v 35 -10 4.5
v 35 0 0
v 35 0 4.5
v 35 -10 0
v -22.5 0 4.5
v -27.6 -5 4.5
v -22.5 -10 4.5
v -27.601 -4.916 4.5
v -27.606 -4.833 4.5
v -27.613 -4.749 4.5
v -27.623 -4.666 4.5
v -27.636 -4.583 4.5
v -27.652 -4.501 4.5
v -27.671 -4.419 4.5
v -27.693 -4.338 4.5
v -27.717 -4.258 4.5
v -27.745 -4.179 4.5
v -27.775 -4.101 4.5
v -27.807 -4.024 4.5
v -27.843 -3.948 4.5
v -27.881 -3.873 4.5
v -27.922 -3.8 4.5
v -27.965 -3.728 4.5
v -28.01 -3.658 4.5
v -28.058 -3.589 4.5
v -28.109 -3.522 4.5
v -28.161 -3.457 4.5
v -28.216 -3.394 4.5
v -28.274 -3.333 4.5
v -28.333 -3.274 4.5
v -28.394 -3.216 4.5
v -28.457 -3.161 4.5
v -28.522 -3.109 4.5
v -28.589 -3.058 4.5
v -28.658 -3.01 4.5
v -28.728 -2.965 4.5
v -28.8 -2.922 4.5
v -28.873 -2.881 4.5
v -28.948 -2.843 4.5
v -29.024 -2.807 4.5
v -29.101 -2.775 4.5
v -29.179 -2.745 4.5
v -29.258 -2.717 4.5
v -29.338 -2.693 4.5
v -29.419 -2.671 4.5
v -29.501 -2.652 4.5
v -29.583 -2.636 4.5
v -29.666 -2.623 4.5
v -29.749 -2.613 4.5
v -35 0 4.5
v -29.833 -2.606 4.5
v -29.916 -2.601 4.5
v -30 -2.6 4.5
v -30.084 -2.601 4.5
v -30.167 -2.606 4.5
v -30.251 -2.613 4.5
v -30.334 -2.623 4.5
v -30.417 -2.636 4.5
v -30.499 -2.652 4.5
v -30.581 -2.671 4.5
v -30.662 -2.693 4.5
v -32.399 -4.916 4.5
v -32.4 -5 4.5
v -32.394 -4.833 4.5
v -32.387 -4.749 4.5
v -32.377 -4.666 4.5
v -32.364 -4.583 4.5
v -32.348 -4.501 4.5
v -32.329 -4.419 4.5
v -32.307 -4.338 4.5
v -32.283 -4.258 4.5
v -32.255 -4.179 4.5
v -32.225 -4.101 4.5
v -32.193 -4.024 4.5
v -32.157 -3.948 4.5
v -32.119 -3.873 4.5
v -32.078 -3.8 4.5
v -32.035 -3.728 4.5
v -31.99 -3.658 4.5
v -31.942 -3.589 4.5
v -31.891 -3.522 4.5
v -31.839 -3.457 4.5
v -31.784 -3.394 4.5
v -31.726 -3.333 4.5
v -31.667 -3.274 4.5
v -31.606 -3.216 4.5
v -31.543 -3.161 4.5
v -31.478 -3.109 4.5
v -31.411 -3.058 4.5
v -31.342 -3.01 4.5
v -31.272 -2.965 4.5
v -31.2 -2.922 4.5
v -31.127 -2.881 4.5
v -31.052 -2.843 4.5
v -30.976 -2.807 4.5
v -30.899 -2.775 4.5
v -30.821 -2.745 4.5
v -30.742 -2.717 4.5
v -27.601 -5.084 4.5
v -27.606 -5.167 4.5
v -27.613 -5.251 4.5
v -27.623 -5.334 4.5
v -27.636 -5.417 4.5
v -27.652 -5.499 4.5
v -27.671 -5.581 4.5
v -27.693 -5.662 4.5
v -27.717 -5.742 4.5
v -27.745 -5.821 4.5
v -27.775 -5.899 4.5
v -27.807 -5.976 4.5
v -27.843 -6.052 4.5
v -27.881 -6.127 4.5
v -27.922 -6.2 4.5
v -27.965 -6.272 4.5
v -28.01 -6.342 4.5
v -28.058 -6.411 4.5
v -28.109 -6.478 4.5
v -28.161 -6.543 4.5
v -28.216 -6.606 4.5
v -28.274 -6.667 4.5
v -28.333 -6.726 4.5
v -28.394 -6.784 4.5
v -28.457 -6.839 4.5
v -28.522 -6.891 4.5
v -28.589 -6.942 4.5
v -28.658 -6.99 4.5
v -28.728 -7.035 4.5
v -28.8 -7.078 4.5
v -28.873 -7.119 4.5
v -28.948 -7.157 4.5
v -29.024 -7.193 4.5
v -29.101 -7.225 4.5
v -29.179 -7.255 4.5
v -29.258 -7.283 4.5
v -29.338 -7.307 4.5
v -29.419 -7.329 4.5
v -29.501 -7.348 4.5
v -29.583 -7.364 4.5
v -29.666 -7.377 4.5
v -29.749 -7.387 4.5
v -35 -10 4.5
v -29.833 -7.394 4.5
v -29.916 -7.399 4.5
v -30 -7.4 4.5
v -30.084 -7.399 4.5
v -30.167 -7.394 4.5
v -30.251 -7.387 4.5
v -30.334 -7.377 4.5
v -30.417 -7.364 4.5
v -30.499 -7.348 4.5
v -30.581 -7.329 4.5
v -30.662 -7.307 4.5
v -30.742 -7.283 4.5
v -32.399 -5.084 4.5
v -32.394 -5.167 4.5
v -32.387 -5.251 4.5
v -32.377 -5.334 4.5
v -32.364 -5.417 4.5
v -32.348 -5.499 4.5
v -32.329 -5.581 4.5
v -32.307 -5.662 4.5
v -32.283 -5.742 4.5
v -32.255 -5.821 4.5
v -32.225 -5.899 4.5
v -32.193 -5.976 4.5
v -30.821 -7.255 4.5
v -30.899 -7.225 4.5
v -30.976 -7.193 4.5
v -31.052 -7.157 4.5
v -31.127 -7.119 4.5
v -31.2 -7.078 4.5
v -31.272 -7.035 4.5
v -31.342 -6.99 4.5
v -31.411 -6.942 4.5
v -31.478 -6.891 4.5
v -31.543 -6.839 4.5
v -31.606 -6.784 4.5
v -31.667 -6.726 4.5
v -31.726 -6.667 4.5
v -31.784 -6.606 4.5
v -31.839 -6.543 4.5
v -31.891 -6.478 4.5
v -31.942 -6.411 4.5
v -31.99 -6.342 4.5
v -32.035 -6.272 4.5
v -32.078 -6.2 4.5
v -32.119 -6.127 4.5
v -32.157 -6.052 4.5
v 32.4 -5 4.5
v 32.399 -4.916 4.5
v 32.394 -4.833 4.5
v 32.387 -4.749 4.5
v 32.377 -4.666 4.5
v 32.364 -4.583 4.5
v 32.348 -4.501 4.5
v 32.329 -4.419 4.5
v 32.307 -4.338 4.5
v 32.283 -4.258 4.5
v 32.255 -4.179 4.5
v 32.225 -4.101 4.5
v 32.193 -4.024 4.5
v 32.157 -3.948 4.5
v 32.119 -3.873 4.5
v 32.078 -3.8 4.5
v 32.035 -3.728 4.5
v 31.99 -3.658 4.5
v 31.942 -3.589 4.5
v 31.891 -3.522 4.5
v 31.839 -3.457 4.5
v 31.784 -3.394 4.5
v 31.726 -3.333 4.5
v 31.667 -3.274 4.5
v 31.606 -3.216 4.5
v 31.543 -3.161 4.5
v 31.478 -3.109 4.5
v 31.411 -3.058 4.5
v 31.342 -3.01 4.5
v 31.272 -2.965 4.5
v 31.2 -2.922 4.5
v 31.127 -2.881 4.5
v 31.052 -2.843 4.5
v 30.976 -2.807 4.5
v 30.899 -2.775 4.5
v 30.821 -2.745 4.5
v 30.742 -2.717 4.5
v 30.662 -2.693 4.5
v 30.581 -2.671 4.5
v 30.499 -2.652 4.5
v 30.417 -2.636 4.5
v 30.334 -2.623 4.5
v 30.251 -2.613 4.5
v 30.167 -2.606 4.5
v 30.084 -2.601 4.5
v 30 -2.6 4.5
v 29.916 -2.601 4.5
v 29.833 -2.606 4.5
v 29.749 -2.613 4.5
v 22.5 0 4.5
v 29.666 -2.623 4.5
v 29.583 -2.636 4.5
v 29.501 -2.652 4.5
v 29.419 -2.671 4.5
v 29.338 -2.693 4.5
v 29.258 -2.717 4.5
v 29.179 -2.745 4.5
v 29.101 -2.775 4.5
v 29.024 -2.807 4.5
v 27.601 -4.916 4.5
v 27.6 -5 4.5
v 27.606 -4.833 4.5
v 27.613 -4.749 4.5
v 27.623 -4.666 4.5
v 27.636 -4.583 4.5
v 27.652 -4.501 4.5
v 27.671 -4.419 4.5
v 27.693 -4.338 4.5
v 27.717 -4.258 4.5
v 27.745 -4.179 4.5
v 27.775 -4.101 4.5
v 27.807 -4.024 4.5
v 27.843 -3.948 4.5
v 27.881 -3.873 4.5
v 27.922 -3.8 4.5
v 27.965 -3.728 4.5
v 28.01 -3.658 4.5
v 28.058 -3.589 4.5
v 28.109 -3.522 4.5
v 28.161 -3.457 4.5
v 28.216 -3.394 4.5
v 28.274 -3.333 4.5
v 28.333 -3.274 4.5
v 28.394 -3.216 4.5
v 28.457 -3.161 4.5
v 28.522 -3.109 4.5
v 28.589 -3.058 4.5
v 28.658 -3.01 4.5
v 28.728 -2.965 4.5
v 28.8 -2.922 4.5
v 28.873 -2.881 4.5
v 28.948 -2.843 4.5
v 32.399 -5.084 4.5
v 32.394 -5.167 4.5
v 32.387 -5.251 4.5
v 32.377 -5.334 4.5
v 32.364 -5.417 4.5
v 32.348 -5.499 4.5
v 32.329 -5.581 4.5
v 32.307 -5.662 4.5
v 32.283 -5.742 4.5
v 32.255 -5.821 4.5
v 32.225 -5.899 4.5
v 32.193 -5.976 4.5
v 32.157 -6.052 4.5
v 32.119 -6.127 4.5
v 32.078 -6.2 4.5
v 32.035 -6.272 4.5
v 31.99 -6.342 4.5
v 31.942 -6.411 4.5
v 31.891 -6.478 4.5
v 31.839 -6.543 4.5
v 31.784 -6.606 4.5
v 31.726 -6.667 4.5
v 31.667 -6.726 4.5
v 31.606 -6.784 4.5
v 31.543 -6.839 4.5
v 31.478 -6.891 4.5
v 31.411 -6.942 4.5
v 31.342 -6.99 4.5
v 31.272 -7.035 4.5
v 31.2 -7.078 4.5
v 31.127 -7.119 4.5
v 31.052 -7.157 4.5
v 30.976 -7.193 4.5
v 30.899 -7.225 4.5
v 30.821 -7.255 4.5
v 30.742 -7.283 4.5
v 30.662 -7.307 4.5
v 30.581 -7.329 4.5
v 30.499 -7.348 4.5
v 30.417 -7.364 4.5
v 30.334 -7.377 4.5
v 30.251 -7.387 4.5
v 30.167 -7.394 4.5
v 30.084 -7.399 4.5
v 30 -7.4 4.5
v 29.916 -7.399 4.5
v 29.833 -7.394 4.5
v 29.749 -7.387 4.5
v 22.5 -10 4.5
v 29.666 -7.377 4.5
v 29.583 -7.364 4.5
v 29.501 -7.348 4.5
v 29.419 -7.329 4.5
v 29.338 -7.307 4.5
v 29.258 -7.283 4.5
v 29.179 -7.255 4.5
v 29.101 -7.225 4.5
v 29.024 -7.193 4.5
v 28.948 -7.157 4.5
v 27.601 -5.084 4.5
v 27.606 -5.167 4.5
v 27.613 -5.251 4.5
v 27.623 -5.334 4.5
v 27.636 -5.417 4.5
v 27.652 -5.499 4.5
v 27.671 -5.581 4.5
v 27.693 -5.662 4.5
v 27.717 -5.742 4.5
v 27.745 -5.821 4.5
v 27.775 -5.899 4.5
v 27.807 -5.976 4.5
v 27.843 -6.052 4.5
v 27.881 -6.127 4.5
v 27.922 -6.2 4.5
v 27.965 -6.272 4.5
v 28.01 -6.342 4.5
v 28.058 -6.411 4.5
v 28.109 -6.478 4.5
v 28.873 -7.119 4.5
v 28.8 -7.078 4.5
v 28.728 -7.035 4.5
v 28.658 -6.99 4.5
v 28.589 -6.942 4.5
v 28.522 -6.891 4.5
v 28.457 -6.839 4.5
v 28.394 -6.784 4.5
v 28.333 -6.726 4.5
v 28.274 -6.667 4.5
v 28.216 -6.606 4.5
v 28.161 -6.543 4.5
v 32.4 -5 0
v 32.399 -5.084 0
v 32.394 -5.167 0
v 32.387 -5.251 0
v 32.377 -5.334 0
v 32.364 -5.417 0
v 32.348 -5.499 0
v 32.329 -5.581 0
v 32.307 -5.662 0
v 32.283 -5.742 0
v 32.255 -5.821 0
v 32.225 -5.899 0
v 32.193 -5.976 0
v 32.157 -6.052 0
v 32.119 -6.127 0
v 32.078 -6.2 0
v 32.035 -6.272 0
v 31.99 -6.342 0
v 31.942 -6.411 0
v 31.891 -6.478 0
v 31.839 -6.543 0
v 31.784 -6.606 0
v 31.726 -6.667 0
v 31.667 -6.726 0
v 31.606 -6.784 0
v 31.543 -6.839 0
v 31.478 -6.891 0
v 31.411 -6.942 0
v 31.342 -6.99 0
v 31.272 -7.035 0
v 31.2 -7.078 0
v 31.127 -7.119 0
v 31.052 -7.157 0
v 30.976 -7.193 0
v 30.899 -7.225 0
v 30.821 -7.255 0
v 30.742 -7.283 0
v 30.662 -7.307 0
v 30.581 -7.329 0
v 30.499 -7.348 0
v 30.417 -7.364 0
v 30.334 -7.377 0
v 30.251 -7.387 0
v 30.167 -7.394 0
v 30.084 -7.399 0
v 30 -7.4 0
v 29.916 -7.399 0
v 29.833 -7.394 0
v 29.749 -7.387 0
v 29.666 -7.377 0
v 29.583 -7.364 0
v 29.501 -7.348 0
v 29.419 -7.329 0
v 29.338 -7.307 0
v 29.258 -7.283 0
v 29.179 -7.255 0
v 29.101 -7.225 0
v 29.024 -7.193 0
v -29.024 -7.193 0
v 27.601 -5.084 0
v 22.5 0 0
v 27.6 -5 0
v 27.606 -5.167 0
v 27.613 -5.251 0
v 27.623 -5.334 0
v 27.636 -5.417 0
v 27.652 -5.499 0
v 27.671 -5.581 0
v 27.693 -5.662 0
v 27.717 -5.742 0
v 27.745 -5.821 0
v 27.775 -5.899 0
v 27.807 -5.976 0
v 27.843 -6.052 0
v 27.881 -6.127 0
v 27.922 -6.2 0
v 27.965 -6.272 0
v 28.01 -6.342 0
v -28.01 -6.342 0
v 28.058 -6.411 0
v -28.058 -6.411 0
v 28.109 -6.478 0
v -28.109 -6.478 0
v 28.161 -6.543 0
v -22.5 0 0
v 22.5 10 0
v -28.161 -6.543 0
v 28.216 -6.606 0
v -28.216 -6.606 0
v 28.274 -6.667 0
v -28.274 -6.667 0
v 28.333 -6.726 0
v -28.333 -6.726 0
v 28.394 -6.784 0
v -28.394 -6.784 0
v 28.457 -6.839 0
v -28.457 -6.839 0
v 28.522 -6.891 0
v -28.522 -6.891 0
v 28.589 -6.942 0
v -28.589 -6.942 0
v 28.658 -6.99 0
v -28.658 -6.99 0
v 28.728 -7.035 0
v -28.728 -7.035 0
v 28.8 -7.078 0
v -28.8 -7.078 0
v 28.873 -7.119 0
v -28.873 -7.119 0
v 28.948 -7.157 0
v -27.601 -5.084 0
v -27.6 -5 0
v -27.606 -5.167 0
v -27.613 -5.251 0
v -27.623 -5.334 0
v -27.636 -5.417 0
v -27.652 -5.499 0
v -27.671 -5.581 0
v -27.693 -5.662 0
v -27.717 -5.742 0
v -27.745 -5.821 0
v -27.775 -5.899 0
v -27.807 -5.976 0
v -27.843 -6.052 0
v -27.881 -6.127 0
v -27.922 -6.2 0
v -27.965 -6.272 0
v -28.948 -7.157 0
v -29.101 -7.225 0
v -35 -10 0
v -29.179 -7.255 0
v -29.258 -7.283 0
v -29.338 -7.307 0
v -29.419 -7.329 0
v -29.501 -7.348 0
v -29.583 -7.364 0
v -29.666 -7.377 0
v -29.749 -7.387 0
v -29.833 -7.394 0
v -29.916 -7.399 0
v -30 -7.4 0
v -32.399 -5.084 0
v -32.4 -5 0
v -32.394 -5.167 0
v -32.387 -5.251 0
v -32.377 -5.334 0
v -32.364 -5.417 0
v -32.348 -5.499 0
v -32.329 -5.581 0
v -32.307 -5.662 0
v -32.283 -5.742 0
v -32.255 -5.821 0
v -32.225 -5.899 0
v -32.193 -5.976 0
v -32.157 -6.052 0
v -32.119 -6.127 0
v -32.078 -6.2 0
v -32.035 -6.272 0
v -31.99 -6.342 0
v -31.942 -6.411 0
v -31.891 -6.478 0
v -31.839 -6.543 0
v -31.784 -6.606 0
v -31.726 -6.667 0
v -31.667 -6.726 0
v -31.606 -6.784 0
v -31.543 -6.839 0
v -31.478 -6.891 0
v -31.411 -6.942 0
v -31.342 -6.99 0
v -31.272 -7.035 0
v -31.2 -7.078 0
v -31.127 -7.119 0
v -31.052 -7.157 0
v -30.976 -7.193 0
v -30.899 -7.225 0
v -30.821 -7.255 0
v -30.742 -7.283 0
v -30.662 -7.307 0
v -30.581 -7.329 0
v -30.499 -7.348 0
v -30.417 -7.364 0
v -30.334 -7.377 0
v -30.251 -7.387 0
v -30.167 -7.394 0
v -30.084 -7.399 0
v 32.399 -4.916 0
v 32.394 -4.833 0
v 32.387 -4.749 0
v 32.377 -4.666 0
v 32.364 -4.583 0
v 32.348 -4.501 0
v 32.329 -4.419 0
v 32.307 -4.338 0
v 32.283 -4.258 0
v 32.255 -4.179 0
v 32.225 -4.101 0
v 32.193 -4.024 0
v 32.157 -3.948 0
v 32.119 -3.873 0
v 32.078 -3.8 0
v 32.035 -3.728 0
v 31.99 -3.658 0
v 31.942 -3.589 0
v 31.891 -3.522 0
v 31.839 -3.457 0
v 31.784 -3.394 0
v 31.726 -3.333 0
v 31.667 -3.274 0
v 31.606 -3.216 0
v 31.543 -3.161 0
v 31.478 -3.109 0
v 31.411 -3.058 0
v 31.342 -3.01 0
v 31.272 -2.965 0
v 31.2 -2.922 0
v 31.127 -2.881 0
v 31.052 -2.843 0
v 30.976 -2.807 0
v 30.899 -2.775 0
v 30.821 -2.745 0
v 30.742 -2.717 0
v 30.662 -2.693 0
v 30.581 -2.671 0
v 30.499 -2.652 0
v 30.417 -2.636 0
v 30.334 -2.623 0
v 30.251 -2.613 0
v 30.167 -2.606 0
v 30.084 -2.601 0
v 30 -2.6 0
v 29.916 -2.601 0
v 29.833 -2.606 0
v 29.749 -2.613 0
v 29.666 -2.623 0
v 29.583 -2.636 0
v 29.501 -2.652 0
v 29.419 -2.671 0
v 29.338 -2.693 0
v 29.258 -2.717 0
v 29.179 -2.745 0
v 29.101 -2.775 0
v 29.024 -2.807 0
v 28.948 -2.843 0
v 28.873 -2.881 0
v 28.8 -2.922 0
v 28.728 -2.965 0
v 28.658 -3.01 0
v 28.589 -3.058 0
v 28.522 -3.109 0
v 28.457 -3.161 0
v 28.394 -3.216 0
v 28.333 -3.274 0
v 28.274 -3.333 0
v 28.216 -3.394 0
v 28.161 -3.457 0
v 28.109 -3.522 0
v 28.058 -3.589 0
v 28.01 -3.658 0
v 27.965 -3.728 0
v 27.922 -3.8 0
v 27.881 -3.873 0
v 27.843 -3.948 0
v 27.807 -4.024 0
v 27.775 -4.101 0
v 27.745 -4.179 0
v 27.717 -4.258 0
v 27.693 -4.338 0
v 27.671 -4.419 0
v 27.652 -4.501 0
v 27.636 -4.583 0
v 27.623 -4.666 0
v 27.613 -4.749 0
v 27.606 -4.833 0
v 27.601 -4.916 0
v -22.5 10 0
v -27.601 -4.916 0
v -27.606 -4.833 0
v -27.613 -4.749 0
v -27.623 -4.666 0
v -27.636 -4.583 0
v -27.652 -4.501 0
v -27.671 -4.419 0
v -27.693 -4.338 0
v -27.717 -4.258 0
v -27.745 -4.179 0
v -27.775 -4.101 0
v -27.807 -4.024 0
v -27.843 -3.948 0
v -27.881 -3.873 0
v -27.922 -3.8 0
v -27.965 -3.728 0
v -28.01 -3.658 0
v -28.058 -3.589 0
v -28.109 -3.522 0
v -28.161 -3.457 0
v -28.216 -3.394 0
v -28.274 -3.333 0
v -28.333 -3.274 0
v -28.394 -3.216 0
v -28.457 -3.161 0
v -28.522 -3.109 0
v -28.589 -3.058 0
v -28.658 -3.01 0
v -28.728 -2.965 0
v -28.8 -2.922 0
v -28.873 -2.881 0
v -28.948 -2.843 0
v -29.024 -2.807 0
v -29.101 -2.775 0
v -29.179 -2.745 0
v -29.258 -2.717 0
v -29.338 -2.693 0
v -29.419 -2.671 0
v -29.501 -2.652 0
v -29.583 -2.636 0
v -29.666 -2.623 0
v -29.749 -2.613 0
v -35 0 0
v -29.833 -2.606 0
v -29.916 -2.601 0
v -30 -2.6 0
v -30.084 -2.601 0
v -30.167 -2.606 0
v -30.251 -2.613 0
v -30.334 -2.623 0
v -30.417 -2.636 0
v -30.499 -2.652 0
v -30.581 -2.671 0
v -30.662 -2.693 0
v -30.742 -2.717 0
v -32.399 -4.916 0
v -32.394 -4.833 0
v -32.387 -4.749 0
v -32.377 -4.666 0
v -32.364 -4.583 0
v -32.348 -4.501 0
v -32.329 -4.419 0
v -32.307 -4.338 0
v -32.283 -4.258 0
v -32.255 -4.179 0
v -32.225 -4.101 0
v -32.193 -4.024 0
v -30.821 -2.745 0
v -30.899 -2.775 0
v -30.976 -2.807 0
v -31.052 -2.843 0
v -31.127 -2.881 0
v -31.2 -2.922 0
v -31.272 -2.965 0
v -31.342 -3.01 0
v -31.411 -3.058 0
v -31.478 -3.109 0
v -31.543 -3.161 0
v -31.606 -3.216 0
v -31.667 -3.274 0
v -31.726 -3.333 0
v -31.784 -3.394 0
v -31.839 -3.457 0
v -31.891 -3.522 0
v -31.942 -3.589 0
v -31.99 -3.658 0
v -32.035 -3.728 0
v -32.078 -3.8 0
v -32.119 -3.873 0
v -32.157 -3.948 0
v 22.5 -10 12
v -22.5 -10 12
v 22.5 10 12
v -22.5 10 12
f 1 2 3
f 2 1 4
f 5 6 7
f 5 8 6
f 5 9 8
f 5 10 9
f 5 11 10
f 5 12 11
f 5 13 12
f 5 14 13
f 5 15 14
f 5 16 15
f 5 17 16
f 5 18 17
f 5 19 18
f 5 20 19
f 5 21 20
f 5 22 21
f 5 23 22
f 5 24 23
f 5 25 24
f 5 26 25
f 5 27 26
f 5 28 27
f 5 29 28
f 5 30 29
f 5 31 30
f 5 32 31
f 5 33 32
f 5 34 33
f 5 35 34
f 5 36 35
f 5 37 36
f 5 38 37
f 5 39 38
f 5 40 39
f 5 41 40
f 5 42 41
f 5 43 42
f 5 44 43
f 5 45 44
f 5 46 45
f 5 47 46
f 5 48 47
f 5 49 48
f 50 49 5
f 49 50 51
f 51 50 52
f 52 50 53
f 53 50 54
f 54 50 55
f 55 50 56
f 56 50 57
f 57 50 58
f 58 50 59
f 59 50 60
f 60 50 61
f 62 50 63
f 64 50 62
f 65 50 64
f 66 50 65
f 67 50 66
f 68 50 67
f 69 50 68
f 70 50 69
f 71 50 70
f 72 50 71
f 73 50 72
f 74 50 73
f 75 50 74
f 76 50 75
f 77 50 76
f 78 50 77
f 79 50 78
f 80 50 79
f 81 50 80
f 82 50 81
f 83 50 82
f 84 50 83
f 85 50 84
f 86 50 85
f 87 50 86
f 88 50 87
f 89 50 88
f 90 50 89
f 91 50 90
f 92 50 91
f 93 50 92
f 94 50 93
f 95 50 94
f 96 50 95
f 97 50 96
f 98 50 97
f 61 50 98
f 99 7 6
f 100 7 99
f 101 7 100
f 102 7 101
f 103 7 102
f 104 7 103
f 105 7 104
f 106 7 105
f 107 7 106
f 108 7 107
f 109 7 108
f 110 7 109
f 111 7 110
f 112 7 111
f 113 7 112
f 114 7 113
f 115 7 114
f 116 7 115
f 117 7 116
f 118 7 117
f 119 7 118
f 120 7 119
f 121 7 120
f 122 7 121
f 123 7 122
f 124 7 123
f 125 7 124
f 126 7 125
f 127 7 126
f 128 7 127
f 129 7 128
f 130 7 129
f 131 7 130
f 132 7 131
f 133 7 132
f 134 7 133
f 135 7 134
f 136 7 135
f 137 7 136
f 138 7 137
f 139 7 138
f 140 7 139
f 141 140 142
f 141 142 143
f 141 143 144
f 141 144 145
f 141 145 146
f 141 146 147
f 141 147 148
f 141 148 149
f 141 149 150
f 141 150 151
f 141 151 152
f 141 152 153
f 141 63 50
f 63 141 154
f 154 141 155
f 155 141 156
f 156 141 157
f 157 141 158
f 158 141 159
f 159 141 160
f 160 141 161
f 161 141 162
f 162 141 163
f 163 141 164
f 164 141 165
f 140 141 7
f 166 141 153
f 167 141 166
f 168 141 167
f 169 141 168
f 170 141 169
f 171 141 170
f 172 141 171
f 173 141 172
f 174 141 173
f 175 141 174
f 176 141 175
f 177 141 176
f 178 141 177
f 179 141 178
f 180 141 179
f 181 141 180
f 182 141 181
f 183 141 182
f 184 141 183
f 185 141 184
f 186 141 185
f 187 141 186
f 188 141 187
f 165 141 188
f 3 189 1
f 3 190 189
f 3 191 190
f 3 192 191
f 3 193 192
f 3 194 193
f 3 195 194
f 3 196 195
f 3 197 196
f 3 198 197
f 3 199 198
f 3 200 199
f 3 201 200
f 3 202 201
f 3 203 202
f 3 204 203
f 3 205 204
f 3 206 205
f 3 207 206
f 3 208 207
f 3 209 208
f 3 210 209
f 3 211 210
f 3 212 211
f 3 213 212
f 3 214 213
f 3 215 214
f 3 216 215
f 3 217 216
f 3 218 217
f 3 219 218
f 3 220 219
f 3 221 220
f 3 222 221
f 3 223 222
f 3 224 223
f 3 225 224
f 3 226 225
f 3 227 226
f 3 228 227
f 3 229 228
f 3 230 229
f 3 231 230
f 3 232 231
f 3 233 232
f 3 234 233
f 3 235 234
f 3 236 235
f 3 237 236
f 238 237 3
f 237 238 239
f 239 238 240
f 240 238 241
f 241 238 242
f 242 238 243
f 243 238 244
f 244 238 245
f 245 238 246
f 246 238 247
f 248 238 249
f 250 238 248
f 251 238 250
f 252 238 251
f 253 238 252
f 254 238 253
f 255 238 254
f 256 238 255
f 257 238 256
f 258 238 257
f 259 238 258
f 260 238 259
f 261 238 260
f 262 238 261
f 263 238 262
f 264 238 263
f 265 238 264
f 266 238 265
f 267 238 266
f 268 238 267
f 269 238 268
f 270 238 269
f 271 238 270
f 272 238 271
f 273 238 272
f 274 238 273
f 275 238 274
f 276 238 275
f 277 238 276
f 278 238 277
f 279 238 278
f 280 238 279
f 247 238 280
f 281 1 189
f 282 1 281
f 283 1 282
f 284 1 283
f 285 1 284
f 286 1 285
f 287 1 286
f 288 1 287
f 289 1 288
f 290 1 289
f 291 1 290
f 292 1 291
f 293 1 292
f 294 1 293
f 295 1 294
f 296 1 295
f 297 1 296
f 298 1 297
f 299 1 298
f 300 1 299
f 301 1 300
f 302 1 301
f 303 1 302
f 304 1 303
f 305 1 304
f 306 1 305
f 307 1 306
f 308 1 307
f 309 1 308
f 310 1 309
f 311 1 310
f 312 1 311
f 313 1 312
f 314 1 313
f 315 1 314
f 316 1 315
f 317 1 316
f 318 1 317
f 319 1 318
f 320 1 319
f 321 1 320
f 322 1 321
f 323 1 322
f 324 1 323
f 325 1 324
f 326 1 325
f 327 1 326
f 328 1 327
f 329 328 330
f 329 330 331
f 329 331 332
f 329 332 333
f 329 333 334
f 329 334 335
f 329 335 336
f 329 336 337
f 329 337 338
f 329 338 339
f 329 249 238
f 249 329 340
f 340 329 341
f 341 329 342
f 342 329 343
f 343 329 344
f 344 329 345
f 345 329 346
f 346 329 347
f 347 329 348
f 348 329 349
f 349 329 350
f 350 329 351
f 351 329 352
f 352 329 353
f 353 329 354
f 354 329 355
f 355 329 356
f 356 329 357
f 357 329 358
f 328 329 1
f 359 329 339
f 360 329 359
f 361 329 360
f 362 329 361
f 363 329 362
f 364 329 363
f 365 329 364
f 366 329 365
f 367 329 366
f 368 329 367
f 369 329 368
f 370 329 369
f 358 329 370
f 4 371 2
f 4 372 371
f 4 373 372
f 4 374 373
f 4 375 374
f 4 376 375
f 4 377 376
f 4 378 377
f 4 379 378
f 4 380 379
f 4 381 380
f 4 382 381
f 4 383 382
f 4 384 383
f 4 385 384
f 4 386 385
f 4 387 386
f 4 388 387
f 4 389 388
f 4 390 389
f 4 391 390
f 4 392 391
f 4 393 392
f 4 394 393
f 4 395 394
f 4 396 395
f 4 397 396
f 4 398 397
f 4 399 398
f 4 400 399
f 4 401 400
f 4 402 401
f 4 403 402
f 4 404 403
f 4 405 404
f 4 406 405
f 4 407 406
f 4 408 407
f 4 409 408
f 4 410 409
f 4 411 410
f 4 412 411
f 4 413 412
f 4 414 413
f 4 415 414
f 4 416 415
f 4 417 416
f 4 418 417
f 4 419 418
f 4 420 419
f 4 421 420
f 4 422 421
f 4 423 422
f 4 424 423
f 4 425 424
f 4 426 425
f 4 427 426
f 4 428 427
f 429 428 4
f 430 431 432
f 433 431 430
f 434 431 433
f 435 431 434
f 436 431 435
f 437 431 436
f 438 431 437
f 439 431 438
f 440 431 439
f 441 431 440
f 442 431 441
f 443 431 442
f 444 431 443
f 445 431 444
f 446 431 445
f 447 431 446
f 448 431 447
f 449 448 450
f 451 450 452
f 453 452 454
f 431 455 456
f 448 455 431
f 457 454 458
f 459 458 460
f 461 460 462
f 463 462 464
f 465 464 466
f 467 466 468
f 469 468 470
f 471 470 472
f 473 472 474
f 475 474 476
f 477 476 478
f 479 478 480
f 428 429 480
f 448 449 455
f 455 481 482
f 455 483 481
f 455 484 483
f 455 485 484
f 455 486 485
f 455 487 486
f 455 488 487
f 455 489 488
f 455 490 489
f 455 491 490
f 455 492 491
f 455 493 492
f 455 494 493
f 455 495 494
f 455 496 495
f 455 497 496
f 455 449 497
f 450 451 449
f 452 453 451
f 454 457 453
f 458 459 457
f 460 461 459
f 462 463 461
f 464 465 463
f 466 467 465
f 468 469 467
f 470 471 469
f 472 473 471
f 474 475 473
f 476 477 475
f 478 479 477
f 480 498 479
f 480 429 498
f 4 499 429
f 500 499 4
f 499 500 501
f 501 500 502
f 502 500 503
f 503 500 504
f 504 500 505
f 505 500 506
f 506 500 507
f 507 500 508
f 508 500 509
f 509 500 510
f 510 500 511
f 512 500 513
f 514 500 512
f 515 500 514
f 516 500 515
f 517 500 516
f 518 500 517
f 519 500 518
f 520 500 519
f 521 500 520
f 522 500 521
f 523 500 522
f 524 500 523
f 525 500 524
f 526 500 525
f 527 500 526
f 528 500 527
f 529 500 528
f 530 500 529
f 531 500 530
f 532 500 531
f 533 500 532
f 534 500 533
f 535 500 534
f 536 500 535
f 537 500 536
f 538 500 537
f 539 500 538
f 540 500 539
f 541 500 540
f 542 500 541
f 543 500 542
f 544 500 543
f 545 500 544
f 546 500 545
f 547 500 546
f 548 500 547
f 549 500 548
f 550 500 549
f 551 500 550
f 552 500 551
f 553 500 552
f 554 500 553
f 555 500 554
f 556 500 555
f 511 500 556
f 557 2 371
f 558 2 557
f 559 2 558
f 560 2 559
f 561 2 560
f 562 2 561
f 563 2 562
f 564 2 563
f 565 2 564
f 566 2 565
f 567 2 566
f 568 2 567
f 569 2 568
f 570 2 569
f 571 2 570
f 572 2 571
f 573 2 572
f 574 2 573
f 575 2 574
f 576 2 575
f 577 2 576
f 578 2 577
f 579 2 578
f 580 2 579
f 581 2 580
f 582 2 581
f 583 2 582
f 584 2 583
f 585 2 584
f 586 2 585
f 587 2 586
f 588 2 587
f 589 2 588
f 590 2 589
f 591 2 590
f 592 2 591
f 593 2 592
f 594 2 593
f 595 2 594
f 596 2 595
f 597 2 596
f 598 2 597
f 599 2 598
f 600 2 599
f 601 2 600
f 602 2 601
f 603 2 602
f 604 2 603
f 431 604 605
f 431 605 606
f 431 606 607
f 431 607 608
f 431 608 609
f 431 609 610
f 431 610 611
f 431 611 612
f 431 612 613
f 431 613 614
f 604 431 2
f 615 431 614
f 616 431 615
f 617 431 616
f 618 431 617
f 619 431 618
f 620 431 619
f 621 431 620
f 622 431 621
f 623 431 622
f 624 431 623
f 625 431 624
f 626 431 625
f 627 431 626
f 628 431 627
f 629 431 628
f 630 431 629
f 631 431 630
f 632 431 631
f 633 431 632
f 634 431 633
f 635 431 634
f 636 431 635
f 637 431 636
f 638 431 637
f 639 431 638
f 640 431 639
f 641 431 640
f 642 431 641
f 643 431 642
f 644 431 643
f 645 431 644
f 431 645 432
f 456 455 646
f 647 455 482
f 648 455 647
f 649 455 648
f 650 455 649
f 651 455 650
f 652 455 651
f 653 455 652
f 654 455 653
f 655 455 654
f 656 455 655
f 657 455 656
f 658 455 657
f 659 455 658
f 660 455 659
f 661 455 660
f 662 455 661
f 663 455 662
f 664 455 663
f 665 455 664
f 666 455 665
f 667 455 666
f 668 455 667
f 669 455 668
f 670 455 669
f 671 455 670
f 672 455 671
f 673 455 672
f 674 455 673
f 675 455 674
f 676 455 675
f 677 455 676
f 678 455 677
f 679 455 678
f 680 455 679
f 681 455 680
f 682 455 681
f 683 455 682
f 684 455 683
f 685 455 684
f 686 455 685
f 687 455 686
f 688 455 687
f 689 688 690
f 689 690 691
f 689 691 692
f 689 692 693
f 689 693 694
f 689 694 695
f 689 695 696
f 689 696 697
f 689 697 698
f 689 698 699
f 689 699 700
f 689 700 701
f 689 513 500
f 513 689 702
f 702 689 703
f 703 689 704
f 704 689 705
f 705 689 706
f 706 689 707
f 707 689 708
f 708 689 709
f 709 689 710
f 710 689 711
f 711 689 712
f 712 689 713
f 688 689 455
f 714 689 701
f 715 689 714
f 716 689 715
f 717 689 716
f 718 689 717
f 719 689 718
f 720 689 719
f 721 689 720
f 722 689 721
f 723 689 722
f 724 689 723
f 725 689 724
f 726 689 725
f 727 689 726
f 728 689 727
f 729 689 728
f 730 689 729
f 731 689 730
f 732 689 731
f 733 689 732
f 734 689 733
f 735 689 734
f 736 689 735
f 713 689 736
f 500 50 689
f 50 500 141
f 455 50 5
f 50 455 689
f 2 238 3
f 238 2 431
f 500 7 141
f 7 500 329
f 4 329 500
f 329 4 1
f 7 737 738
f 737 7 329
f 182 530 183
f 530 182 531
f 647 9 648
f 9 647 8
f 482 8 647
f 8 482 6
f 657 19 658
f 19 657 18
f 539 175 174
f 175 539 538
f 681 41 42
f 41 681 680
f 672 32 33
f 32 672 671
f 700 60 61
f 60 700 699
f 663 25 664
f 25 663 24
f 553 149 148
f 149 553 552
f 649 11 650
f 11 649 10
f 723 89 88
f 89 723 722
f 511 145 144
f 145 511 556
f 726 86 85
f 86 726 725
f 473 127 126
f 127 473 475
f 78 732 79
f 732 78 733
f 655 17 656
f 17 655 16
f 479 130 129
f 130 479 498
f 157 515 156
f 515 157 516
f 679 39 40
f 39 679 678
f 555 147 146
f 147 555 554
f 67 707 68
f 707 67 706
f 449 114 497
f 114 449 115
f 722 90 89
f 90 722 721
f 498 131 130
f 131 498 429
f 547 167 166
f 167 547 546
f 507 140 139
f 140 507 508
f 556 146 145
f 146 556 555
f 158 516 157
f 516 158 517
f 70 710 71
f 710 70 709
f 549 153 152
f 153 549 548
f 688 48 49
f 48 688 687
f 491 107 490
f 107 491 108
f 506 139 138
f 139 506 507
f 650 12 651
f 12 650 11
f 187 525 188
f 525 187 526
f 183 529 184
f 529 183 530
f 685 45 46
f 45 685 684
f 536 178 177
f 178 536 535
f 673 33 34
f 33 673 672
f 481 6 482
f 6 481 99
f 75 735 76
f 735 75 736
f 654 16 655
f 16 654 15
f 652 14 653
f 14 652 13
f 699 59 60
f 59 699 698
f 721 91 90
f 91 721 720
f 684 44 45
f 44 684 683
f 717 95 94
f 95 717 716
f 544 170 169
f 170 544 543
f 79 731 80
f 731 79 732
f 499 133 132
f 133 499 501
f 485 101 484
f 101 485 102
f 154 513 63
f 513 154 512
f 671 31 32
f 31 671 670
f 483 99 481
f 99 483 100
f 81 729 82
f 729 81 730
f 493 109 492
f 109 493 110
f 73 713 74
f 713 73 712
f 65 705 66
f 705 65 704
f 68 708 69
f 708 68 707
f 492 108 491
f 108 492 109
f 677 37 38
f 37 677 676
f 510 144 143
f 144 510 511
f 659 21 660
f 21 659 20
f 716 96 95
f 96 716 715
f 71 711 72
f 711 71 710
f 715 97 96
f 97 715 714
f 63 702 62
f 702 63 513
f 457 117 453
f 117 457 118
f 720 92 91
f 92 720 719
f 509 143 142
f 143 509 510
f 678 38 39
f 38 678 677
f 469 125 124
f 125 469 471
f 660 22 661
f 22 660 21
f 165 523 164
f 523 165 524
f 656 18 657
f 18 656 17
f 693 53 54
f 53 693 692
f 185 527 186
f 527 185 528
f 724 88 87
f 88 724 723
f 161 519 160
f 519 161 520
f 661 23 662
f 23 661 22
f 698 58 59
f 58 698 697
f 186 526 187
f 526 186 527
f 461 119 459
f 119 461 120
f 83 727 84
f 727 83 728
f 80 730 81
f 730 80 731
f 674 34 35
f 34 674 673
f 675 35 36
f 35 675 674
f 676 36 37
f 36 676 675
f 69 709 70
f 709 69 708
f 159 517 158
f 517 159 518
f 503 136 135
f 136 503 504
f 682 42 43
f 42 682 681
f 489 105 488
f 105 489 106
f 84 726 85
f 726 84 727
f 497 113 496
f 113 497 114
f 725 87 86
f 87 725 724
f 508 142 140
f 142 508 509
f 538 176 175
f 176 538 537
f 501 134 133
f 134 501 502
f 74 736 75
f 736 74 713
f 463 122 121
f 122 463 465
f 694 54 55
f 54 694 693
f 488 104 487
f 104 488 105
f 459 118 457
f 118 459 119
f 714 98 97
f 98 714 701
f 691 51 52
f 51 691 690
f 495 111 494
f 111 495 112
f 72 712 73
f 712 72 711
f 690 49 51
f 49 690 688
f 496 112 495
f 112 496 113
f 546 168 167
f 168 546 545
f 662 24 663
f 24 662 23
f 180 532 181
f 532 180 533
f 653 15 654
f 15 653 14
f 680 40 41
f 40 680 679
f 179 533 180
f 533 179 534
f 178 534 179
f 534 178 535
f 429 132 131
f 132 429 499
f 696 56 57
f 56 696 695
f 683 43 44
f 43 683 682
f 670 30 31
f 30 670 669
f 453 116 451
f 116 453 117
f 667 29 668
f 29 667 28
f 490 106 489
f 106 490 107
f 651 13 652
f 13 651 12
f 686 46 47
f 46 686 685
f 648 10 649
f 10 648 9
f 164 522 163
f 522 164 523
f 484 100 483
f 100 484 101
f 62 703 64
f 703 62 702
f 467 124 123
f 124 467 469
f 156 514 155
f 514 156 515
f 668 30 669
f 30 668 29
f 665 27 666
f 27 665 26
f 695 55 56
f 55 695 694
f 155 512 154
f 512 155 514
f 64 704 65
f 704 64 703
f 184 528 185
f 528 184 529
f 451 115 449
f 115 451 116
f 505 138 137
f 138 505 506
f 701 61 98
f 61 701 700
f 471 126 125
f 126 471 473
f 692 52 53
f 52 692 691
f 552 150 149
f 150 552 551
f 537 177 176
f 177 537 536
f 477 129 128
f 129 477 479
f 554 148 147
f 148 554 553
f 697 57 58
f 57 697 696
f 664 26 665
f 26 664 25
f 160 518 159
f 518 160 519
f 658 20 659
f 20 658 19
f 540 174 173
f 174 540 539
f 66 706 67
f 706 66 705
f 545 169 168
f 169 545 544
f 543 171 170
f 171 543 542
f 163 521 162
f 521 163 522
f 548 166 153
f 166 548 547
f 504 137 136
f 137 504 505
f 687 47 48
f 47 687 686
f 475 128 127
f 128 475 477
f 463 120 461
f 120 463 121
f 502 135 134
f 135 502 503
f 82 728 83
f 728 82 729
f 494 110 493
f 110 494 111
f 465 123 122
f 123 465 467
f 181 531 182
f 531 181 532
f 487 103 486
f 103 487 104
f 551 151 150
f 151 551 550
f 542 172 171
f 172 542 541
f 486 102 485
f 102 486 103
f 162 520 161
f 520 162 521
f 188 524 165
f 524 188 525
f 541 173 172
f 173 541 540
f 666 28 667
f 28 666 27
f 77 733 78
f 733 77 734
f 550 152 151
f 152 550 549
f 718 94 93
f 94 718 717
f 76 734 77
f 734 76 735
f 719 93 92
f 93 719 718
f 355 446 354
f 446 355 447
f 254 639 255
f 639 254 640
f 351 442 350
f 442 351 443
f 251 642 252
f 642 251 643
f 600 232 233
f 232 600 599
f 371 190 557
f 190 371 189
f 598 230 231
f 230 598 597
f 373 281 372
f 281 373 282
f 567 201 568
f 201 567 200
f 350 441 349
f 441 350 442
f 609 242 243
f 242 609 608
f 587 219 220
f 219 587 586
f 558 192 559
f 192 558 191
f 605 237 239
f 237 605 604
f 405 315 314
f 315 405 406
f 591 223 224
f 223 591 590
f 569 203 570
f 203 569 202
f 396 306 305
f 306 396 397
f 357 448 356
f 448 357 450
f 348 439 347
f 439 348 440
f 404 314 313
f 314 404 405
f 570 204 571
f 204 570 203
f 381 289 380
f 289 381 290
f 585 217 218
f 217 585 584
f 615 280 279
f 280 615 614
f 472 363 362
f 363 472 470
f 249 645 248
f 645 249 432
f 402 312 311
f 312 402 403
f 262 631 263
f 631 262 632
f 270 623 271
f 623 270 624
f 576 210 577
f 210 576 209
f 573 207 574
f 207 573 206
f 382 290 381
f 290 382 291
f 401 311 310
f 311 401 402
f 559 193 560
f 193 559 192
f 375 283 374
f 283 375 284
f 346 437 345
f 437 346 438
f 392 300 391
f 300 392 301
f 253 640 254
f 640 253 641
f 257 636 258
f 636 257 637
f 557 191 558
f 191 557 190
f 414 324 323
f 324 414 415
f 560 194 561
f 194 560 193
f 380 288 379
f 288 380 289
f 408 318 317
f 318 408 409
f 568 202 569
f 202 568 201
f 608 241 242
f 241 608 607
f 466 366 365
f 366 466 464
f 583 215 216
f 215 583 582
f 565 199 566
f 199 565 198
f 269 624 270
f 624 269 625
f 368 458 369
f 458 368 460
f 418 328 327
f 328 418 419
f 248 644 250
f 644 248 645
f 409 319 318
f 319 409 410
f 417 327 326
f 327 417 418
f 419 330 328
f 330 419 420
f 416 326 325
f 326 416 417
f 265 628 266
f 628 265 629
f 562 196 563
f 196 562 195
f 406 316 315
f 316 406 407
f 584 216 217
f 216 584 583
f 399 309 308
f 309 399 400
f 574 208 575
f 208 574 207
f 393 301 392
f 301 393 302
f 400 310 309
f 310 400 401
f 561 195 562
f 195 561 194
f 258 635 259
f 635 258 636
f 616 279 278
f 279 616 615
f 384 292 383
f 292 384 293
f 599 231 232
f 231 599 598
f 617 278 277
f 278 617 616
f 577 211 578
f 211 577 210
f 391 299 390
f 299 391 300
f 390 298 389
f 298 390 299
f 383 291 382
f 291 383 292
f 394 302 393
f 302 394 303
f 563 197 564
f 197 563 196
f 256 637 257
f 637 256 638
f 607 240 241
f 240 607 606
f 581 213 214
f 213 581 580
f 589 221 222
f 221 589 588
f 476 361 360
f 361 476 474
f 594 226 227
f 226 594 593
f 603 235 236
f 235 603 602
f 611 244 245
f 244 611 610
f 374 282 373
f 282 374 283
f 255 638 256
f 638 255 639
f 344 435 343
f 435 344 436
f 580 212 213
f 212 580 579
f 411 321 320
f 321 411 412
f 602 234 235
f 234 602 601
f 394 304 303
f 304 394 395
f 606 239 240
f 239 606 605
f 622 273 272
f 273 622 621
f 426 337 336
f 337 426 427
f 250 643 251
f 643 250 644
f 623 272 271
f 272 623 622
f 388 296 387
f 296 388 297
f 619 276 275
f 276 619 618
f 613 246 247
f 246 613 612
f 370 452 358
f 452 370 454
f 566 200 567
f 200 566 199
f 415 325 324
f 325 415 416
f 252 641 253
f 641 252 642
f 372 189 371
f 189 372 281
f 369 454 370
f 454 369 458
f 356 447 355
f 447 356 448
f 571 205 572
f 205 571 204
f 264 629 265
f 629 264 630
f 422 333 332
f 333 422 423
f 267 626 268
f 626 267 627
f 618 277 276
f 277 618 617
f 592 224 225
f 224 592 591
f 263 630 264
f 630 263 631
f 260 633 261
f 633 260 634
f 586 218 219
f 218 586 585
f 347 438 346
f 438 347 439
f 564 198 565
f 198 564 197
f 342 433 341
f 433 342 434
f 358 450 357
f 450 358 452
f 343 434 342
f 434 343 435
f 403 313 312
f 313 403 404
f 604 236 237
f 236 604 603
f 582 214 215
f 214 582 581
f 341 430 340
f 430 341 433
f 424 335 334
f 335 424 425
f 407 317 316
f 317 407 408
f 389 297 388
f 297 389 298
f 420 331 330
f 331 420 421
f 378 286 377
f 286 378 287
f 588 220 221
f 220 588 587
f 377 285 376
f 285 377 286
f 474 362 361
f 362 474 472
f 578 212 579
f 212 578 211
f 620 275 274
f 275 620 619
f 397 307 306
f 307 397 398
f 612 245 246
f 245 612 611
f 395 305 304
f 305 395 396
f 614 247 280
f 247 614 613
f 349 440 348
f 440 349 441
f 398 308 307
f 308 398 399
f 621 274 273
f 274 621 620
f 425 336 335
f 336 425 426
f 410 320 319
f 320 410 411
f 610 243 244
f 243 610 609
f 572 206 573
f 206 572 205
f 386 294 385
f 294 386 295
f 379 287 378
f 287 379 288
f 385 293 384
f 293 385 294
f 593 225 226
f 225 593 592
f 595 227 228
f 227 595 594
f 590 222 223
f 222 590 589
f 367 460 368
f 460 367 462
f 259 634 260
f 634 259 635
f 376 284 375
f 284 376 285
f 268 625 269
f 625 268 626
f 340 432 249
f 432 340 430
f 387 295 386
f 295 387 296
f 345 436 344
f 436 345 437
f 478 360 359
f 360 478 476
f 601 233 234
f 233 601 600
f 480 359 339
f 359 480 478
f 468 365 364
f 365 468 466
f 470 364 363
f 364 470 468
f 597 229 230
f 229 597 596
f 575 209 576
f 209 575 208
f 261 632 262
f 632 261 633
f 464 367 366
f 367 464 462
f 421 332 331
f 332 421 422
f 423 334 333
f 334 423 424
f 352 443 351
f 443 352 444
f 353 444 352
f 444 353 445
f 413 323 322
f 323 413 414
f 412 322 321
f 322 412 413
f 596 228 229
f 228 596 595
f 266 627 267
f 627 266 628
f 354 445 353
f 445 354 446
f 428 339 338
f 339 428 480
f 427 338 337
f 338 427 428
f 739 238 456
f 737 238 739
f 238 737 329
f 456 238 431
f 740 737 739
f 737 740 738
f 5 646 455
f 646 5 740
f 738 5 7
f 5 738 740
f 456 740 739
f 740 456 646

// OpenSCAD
$fn=180;
//intended to support extruder motor mounted on top of plate
module plate_spacer() {
    difference() {
        translate([-(70)/2,-10,0]) cube([70,10,4.5]);
        translate([-60/2,-10/2,0]) cylinder(d=4.8,h=20);
        translate([60/2,-10/2,0]) cylinder(d=4.8,h=20);
    }
    translate([-45/2,-10,0]) cube([45,20,12]);
}
plate_spacer();
